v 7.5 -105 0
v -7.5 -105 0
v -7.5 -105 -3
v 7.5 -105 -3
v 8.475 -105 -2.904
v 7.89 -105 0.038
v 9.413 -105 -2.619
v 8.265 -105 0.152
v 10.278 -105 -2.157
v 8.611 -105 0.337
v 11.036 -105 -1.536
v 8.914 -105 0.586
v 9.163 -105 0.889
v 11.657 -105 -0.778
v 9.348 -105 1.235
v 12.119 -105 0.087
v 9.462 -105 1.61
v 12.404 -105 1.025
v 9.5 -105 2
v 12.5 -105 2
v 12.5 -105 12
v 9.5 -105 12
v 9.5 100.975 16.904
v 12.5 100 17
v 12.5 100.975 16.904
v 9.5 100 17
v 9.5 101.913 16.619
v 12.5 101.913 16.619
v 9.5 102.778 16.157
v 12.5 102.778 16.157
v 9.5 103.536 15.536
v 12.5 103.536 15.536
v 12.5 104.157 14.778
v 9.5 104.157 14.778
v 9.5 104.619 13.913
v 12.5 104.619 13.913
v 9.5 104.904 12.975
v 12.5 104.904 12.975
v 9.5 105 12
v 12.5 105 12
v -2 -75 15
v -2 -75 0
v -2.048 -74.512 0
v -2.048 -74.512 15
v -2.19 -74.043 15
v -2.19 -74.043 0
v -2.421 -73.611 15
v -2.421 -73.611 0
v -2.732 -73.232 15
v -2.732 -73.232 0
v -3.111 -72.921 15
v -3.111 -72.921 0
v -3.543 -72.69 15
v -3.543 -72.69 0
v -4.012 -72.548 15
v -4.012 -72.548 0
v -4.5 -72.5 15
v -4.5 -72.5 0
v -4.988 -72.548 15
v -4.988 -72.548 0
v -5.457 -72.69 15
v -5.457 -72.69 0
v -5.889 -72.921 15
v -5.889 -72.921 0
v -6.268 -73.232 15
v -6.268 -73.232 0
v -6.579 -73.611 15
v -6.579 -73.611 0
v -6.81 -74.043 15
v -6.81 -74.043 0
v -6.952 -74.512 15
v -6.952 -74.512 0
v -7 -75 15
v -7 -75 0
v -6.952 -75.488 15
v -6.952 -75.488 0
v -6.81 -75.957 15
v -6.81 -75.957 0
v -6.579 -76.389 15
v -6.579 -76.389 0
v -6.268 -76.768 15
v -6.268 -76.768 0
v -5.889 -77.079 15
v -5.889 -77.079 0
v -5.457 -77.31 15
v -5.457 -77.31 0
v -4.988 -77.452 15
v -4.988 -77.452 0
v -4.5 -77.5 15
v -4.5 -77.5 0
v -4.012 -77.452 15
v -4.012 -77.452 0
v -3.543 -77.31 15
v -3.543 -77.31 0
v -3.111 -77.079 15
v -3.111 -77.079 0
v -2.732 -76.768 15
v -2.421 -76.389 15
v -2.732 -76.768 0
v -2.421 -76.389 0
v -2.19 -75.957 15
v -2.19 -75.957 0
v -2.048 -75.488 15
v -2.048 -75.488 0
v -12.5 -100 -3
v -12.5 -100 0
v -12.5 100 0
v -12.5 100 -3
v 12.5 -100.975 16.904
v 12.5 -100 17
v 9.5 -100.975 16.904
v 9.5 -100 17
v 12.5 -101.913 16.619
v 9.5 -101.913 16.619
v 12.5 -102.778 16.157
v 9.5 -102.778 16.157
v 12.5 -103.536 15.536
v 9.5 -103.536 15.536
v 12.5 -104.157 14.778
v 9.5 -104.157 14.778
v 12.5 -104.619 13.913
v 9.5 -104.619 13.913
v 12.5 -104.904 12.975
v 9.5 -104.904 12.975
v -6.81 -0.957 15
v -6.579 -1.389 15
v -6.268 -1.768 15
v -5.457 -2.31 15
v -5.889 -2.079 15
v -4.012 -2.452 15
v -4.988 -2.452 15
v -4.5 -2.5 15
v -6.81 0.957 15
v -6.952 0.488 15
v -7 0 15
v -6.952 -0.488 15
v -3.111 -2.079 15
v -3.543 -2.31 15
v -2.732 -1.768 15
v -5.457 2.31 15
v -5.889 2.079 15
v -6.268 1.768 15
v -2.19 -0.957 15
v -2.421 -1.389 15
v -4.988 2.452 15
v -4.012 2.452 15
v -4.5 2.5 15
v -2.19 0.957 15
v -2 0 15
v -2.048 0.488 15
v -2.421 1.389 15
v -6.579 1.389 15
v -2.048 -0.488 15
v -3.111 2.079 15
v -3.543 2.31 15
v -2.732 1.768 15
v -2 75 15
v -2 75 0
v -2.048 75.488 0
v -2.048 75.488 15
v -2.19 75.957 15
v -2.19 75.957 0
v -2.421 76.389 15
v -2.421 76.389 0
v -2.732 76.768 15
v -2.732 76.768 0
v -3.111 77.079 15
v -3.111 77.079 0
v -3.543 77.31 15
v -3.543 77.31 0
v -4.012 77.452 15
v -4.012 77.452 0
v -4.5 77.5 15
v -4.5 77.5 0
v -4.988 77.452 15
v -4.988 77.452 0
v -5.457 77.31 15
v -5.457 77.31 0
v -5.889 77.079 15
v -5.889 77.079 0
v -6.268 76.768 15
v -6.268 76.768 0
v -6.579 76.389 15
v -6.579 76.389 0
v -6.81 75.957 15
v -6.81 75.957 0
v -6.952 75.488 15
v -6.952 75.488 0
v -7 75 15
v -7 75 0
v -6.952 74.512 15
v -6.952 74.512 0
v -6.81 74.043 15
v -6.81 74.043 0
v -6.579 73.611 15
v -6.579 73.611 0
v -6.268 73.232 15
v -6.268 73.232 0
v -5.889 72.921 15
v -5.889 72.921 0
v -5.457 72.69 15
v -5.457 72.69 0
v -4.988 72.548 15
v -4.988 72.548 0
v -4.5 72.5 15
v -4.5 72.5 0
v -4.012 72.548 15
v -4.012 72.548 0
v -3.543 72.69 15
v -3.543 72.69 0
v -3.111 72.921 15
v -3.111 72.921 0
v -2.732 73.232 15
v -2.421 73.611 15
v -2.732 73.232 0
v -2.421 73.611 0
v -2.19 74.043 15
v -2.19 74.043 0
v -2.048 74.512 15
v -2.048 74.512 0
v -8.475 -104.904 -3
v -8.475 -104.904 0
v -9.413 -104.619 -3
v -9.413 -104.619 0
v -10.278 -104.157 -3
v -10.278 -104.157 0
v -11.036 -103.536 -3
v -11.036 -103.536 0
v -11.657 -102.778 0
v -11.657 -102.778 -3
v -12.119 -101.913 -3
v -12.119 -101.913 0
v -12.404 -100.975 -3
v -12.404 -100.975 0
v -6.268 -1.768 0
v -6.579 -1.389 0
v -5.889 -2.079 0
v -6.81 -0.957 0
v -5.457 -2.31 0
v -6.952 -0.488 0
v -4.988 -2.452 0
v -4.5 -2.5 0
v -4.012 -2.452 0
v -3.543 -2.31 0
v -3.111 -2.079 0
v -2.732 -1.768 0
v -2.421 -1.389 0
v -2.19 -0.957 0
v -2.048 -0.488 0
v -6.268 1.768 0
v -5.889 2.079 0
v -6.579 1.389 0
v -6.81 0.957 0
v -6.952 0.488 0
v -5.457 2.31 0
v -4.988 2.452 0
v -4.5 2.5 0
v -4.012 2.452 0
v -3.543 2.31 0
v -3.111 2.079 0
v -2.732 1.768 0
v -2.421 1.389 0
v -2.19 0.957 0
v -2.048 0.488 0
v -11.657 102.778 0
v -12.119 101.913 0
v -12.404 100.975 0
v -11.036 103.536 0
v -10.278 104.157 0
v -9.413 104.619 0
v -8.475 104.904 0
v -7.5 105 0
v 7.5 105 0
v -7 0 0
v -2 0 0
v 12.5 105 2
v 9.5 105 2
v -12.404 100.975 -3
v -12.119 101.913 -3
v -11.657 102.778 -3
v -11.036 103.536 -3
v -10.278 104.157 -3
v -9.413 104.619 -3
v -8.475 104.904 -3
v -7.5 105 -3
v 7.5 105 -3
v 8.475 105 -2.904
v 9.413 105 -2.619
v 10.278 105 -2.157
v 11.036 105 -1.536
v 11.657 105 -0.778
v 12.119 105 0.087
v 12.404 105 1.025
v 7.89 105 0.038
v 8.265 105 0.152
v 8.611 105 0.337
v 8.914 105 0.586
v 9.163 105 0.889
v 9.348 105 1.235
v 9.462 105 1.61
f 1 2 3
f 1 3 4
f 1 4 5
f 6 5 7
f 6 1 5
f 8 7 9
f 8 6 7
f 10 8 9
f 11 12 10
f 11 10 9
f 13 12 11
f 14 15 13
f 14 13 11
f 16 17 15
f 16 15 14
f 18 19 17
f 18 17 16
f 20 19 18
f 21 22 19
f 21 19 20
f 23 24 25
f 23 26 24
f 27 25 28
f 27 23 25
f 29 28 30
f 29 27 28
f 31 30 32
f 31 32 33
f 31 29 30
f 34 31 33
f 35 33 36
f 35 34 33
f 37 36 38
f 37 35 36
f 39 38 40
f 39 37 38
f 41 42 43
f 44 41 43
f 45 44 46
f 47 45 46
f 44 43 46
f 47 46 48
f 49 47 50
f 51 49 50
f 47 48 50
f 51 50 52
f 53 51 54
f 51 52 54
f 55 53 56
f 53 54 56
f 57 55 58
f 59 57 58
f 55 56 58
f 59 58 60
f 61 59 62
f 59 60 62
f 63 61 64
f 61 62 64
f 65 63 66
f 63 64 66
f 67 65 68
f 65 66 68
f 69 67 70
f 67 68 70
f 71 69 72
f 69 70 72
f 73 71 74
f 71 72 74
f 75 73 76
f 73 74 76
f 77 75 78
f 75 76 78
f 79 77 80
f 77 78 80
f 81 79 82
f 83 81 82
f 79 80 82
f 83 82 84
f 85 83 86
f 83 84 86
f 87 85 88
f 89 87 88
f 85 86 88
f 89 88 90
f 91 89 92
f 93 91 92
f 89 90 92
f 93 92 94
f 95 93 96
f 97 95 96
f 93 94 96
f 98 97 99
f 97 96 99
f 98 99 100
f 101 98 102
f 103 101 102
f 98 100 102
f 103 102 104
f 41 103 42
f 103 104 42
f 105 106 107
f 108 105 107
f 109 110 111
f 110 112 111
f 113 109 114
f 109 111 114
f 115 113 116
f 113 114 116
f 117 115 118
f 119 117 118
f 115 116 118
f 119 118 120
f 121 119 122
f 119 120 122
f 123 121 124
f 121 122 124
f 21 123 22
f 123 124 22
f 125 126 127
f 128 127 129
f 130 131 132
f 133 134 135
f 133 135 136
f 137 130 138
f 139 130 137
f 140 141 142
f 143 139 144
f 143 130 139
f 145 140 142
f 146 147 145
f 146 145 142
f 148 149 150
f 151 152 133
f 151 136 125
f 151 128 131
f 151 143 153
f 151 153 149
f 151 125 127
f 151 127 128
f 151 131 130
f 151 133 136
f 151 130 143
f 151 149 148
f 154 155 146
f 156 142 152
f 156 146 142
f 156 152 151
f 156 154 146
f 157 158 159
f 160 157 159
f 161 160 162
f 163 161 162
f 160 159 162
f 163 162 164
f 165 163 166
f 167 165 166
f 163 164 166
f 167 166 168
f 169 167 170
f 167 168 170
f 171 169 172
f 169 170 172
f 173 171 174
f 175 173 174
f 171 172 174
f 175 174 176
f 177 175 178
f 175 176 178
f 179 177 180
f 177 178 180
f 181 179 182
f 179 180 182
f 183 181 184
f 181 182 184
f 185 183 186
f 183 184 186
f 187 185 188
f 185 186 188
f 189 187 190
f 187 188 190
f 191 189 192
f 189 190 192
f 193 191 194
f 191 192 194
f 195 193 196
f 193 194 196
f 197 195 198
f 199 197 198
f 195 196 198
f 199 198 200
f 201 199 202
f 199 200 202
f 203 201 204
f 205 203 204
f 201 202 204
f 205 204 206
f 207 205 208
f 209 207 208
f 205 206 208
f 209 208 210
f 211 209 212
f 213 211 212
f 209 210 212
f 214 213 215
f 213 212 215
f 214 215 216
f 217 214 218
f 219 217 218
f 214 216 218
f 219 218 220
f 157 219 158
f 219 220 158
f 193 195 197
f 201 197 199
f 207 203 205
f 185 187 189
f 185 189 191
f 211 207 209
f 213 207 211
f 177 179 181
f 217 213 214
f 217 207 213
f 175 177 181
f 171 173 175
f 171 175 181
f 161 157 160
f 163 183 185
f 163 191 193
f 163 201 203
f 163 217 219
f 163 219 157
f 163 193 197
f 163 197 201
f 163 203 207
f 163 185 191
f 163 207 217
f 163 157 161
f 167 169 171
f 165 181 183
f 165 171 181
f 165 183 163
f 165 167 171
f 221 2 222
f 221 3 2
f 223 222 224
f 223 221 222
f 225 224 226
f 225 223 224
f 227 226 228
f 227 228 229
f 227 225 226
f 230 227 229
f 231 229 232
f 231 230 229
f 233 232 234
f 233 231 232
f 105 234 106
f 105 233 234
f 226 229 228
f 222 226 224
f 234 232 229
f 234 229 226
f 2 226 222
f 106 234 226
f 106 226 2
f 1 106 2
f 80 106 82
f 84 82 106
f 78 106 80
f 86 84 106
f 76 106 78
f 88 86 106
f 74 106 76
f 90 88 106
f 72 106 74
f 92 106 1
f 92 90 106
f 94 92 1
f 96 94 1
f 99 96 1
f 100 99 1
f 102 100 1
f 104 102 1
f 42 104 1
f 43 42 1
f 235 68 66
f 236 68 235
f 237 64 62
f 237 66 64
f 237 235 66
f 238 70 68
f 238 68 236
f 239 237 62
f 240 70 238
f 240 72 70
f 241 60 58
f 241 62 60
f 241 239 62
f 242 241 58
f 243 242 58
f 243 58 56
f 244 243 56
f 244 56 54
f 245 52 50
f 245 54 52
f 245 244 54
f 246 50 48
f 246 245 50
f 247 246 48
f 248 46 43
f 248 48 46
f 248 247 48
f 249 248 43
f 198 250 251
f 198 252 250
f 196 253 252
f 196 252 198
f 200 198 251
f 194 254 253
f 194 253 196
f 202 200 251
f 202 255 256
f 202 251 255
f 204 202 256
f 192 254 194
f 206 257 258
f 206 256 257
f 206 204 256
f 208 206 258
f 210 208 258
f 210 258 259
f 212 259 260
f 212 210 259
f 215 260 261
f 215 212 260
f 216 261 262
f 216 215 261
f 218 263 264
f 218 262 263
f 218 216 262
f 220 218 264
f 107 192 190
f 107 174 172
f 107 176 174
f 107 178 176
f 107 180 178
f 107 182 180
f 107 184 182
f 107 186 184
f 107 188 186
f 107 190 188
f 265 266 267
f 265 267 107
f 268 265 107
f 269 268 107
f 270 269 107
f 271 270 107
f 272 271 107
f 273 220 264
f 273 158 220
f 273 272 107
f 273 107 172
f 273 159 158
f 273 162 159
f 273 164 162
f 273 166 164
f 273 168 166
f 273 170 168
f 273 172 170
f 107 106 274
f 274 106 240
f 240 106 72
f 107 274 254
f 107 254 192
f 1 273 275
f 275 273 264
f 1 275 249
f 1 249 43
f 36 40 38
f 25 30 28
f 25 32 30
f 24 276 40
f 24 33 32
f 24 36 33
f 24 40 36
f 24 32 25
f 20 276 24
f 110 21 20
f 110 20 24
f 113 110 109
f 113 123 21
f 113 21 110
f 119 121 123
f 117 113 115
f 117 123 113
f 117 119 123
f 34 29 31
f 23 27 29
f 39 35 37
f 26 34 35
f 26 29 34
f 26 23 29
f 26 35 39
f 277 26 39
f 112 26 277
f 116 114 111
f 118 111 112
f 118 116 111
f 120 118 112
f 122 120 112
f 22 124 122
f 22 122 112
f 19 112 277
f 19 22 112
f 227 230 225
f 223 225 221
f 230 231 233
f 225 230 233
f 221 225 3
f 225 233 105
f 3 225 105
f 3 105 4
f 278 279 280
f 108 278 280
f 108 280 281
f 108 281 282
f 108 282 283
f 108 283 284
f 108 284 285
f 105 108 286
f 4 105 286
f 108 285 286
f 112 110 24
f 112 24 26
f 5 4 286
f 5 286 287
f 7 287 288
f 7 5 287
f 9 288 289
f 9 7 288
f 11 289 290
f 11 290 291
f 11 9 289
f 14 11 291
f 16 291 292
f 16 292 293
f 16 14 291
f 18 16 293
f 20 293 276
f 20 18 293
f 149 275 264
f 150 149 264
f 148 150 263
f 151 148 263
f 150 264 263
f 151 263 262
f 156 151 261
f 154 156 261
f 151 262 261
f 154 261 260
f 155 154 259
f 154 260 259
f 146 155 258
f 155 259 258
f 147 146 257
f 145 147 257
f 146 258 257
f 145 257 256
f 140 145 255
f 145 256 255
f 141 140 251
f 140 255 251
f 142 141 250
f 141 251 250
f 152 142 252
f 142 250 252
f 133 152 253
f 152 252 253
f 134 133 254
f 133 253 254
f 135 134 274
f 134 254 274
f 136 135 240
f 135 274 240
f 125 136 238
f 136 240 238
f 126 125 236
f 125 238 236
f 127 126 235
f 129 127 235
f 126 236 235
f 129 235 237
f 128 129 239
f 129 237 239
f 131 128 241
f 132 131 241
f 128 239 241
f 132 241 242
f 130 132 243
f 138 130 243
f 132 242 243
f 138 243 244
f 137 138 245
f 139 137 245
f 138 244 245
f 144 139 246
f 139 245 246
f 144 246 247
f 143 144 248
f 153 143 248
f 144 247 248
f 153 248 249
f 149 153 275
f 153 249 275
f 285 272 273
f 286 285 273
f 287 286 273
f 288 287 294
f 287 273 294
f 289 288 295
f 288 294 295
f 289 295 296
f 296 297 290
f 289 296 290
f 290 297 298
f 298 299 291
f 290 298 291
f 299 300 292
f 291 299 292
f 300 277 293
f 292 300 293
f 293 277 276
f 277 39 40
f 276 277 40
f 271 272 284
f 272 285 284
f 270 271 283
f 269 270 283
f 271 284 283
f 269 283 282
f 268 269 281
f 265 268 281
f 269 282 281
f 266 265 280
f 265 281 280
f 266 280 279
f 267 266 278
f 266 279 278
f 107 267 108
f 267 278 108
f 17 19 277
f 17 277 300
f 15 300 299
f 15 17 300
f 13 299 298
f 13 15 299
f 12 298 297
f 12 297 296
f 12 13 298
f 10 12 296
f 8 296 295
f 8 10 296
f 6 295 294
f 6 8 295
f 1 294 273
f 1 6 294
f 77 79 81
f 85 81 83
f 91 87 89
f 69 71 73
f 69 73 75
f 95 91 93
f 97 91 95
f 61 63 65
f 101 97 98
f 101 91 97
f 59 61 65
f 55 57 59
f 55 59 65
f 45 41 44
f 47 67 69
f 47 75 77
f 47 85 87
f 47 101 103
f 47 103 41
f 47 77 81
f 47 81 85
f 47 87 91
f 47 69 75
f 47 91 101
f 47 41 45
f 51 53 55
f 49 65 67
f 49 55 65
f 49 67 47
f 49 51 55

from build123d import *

# Parameters (mm, degrees)
SKETCH_1_W                       = 25
SKETCH_1_H                       = 210
SM_BASE_FLANGE_1_DEPTH           = 3
SM_EDGE_FLANGE_1_STRIP_W         = 16
SM_EDGE_FLANGE_1_STRIP_H         = 3
SM_EDGE_FLANGE_1_STRIP_CUT_DEPTH = 210
SM_EDGE_FLANGE_1_DEPTH           = 210
SKETCH_9_R                       = 2.5
EXTRUDE_1_DEPTH                  = 15
FILLET_1_R                       = 5


# Sheet-metal steps are written as plain solids
with BuildPart() as part:
    # Sketch 1 → 基体-法兰1 (new body)
    with BuildSketch(Plane.XY):
        Rectangle(SKETCH_1_W, SKETCH_1_H)
    extrude(amount=-SM_BASE_FLANGE_1_DEPTH)

    # 边线-法兰1 strip (across the edge) → 边线-法兰1 strip cut (cut)
    with BuildSketch(Plane(origin=(12.5, -105, 0), x_dir=(-1, 0, 0), z_dir=(0, 1, 0))):
        with Locations((-3, -1.5)):
            Rectangle(SM_EDGE_FLANGE_1_STRIP_W, SM_EDGE_FLANGE_1_STRIP_H)
    extrude(amount=SM_EDGE_FLANGE_1_STRIP_CUT_DEPTH, mode=Mode.SUBTRACT)

    # 边线-法兰1 section (across the edge) → 边线-法兰1 (add)
    with BuildSketch(Plane(origin=(12.5, -105, 0), x_dir=(-1, 0, 0), z_dir=(0, 1, 0))):
        with BuildLine():
            Line((0, 2), (0, 17))
            Line((0, 17), (3, 17))
            Line((3, 17), (3, 2))
            ThreePointArc((3, 2), (3.585786438, 0.585786438), (5, 0))
            Line((5, 0), (5, -3))
            ThreePointArc((5, -3), (1.464466094, -1.535533906), (0, 2))
        make_face()
    extrude(amount=SM_EDGE_FLANGE_1_DEPTH)

    # 草图9 → 凸台-拉伸1 (add)
    with BuildSketch(Plane.XY):
        with Locations((-4.5, 0)):
            Circle(SKETCH_9_R)
        with Locations((-4.5, -75)):
            Circle(SKETCH_9_R)
        with Locations((-4.5, 75)):
            Circle(SKETCH_9_R)
    extrude(amount=EXTRUDE_1_DEPTH)

    # 圆角1
    fillet_1_edges = [part.edges().sort_by_distance(p)[0] for p in [
        (11, -105, 17),
        (11, 105, 17),
        (-12.5, -105, -1.5),
        (-12.5, 105, -1.5),
    ]]
    fillet(fillet_1_edges, radius=FILLET_1_R)


solid = part.part
